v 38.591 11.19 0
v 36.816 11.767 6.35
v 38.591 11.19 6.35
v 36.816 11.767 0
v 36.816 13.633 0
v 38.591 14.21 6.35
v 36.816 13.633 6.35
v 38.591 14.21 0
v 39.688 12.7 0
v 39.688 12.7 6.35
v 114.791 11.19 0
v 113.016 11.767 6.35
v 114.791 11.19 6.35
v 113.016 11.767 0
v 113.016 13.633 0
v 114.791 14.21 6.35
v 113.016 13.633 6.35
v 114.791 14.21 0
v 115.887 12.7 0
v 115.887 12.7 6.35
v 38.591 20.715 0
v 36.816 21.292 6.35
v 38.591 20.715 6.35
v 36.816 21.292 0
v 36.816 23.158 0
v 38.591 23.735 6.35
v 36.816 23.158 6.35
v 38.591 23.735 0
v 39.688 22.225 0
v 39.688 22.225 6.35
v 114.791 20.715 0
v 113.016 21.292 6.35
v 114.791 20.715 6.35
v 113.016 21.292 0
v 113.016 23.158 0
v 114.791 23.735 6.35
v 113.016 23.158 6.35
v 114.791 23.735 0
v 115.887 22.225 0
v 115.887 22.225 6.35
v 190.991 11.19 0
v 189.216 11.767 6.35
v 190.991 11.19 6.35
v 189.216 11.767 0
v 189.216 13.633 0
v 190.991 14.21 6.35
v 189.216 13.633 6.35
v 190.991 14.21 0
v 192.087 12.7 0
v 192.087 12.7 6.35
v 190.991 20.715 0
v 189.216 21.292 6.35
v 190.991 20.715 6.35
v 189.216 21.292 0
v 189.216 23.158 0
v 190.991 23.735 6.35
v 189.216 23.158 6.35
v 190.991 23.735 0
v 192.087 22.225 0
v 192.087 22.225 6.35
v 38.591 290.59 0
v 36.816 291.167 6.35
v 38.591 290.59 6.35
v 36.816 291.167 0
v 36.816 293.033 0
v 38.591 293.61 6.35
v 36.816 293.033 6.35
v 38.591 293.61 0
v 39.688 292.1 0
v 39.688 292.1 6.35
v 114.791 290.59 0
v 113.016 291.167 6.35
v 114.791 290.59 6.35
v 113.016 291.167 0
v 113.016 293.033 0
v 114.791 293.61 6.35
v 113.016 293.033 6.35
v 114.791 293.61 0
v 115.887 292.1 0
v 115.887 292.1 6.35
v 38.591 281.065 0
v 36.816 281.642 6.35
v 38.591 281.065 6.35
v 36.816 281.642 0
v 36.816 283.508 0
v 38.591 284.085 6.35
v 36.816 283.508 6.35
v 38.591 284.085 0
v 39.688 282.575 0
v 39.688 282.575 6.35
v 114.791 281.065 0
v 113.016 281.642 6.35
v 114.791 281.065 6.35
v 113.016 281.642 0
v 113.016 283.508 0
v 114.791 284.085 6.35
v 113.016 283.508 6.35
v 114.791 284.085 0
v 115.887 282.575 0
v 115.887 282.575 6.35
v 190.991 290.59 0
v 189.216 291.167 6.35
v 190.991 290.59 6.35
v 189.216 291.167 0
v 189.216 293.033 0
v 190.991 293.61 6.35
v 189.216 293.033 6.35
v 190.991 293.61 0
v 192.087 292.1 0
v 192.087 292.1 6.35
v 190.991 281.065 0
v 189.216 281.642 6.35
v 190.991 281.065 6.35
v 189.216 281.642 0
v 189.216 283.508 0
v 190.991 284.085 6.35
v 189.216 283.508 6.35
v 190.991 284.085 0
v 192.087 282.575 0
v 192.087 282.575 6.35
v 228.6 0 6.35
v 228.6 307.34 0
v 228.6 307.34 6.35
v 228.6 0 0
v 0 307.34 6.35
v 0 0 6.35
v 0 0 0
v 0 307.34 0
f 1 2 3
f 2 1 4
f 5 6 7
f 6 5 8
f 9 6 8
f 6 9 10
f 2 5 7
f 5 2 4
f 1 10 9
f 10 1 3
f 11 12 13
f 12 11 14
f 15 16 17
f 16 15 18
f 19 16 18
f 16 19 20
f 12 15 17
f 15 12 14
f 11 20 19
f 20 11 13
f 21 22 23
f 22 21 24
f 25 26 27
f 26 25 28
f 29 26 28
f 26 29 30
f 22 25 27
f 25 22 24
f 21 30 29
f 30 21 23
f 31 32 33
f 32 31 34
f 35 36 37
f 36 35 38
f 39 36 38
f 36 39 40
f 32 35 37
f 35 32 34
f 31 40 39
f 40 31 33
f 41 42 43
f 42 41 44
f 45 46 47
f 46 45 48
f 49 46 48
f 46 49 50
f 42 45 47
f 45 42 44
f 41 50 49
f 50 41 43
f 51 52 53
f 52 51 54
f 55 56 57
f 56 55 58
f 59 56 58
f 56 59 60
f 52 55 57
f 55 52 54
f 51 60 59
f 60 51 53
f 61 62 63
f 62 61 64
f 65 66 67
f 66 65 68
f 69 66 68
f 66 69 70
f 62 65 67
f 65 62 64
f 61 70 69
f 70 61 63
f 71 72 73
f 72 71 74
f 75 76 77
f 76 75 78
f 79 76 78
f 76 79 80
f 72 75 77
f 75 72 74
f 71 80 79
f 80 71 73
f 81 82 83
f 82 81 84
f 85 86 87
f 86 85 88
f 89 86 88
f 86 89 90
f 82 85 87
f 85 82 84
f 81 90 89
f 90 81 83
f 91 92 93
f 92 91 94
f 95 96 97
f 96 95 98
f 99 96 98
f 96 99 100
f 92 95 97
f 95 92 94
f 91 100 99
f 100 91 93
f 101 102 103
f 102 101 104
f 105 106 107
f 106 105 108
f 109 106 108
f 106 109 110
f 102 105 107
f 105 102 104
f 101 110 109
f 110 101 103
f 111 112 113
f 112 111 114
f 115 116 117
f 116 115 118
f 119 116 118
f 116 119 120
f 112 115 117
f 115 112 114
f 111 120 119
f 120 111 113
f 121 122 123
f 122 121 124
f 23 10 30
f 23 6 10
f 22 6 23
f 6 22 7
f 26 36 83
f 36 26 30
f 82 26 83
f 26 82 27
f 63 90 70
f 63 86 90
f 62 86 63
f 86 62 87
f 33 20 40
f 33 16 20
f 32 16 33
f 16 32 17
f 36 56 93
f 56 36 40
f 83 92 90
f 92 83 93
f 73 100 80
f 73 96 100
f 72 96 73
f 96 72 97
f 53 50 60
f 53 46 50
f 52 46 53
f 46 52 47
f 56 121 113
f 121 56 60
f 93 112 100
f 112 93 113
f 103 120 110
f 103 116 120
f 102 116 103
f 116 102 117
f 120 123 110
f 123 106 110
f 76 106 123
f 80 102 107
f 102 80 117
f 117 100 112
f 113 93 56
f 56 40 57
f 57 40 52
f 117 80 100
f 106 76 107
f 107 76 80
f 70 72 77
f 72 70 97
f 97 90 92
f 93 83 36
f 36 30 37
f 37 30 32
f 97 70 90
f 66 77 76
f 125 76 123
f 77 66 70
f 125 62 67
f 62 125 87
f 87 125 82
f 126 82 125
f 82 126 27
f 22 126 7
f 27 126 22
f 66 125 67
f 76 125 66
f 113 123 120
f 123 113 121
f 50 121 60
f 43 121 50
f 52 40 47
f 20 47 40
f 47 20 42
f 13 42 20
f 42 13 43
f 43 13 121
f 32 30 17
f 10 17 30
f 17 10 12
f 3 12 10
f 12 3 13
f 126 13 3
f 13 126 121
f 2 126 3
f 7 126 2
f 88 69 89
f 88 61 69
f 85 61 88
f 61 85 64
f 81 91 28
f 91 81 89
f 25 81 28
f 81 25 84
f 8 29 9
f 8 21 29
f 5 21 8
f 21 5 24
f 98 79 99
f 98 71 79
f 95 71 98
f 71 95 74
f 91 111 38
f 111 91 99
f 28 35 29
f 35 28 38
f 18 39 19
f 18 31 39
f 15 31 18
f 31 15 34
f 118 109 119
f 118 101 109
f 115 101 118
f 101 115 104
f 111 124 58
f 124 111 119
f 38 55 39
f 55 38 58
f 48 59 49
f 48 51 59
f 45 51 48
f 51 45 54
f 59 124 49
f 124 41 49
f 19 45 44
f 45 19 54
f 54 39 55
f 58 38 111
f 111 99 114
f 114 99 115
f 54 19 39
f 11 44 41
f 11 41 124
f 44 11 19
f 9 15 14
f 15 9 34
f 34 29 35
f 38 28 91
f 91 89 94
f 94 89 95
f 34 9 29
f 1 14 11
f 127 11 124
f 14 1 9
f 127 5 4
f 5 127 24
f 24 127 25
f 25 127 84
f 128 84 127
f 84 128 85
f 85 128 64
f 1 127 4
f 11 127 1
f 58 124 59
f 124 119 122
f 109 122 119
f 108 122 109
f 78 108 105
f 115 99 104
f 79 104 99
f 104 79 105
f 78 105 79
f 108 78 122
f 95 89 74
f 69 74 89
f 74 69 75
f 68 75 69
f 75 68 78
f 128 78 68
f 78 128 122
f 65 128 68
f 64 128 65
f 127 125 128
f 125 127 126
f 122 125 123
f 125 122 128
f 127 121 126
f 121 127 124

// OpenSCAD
function mm(i) = i*25.4; 
    rolldiam = mm(8); //diameter of the roll of paper
	 rollheight = mm(11); //height of a roll of paper
	 thickness= mm(.25); // thickness of material
	 boltwidth = mm(1/8); // desired diameter of bolt holes


module base(thickness = mm(.25), rolldiam=mm(8), boltwidth=mm(1/8))
	{
		difference()
			{
				cube([rolldiam+mm(1), rollheight+mm(1.1), thickness]);
				translate([0,0,0])
				{
					union()
						{	
					translate([mm(1)+mm(1/2),mm(.5),-1])
					{
						cylinder(thickness+2, boltwidth/2, boltwidth/2, 0);
					}
					translate([rolldiam/2+mm(1/2),mm(.5),-1])
					{
						cylinder(thickness+2, boltwidth/2, boltwidth/2, 0);
					}
					translate([mm(1)+mm(1/2),mm(.5)+mm(.375),-1])
					{
						cylinder(thickness+2, boltwidth/2, boltwidth/2, 0);
					}
					translate([rolldiam/2+mm(1/2),mm(.5)+mm(.375),-1])
					{
						cylinder(thickness+2, boltwidth/2, boltwidth/2, 0);
					}
					translate([rolldiam-mm(1)+mm(1/2),mm(.5),-1])
					{
						cylinder(thickness+2, boltwidth/2, boltwidth/2, 0);
					}
					translate([rolldiam-mm(1)+mm(1/2),mm(.5)+mm(.375),-1])
					{
						cylinder(thickness+2, boltwidth/2, boltwidth/2, 0);
					}
					translate([mm(1)+mm(1/2),rollheight+mm(1)-mm(.5),-1])
					{
						cylinder(thickness+2, boltwidth/2, boltwidth/2, 0);
					}
					translate([rolldiam/2+mm(1/2),rollheight+mm(1)-mm(.5),-1])
					{
						cylinder(thickness+2, boltwidth/2, boltwidth/2, 0);
					}
					translate([mm(1)+mm(1/2),rollheight+mm(1)-mm(.5)-mm(.375),-1])
					{
						cylinder(thickness+2, boltwidth/2, boltwidth/2, 0);
					}
					translate([rolldiam/2+mm(1/2),rollheight+mm(1)-mm(.5)-mm(.375),-1])
					{
						cylinder(thickness+2, boltwidth/2, boltwidth/2, 0);
					}
					translate([rolldiam-mm(1)+mm(1/2),rollheight+mm(1)-mm(.5),-1])
					{
						cylinder(thickness+2, boltwidth/2, boltwidth/2, 0);
					}
					translate([rolldiam-mm(1)+mm(1/2),rollheight+mm(1)-mm(.5)-mm(.375),-1])
					{
						cylinder(thickness+2, boltwidth/2, boltwidth/2, 0);
					}
				}
			}
	}
}

base();
